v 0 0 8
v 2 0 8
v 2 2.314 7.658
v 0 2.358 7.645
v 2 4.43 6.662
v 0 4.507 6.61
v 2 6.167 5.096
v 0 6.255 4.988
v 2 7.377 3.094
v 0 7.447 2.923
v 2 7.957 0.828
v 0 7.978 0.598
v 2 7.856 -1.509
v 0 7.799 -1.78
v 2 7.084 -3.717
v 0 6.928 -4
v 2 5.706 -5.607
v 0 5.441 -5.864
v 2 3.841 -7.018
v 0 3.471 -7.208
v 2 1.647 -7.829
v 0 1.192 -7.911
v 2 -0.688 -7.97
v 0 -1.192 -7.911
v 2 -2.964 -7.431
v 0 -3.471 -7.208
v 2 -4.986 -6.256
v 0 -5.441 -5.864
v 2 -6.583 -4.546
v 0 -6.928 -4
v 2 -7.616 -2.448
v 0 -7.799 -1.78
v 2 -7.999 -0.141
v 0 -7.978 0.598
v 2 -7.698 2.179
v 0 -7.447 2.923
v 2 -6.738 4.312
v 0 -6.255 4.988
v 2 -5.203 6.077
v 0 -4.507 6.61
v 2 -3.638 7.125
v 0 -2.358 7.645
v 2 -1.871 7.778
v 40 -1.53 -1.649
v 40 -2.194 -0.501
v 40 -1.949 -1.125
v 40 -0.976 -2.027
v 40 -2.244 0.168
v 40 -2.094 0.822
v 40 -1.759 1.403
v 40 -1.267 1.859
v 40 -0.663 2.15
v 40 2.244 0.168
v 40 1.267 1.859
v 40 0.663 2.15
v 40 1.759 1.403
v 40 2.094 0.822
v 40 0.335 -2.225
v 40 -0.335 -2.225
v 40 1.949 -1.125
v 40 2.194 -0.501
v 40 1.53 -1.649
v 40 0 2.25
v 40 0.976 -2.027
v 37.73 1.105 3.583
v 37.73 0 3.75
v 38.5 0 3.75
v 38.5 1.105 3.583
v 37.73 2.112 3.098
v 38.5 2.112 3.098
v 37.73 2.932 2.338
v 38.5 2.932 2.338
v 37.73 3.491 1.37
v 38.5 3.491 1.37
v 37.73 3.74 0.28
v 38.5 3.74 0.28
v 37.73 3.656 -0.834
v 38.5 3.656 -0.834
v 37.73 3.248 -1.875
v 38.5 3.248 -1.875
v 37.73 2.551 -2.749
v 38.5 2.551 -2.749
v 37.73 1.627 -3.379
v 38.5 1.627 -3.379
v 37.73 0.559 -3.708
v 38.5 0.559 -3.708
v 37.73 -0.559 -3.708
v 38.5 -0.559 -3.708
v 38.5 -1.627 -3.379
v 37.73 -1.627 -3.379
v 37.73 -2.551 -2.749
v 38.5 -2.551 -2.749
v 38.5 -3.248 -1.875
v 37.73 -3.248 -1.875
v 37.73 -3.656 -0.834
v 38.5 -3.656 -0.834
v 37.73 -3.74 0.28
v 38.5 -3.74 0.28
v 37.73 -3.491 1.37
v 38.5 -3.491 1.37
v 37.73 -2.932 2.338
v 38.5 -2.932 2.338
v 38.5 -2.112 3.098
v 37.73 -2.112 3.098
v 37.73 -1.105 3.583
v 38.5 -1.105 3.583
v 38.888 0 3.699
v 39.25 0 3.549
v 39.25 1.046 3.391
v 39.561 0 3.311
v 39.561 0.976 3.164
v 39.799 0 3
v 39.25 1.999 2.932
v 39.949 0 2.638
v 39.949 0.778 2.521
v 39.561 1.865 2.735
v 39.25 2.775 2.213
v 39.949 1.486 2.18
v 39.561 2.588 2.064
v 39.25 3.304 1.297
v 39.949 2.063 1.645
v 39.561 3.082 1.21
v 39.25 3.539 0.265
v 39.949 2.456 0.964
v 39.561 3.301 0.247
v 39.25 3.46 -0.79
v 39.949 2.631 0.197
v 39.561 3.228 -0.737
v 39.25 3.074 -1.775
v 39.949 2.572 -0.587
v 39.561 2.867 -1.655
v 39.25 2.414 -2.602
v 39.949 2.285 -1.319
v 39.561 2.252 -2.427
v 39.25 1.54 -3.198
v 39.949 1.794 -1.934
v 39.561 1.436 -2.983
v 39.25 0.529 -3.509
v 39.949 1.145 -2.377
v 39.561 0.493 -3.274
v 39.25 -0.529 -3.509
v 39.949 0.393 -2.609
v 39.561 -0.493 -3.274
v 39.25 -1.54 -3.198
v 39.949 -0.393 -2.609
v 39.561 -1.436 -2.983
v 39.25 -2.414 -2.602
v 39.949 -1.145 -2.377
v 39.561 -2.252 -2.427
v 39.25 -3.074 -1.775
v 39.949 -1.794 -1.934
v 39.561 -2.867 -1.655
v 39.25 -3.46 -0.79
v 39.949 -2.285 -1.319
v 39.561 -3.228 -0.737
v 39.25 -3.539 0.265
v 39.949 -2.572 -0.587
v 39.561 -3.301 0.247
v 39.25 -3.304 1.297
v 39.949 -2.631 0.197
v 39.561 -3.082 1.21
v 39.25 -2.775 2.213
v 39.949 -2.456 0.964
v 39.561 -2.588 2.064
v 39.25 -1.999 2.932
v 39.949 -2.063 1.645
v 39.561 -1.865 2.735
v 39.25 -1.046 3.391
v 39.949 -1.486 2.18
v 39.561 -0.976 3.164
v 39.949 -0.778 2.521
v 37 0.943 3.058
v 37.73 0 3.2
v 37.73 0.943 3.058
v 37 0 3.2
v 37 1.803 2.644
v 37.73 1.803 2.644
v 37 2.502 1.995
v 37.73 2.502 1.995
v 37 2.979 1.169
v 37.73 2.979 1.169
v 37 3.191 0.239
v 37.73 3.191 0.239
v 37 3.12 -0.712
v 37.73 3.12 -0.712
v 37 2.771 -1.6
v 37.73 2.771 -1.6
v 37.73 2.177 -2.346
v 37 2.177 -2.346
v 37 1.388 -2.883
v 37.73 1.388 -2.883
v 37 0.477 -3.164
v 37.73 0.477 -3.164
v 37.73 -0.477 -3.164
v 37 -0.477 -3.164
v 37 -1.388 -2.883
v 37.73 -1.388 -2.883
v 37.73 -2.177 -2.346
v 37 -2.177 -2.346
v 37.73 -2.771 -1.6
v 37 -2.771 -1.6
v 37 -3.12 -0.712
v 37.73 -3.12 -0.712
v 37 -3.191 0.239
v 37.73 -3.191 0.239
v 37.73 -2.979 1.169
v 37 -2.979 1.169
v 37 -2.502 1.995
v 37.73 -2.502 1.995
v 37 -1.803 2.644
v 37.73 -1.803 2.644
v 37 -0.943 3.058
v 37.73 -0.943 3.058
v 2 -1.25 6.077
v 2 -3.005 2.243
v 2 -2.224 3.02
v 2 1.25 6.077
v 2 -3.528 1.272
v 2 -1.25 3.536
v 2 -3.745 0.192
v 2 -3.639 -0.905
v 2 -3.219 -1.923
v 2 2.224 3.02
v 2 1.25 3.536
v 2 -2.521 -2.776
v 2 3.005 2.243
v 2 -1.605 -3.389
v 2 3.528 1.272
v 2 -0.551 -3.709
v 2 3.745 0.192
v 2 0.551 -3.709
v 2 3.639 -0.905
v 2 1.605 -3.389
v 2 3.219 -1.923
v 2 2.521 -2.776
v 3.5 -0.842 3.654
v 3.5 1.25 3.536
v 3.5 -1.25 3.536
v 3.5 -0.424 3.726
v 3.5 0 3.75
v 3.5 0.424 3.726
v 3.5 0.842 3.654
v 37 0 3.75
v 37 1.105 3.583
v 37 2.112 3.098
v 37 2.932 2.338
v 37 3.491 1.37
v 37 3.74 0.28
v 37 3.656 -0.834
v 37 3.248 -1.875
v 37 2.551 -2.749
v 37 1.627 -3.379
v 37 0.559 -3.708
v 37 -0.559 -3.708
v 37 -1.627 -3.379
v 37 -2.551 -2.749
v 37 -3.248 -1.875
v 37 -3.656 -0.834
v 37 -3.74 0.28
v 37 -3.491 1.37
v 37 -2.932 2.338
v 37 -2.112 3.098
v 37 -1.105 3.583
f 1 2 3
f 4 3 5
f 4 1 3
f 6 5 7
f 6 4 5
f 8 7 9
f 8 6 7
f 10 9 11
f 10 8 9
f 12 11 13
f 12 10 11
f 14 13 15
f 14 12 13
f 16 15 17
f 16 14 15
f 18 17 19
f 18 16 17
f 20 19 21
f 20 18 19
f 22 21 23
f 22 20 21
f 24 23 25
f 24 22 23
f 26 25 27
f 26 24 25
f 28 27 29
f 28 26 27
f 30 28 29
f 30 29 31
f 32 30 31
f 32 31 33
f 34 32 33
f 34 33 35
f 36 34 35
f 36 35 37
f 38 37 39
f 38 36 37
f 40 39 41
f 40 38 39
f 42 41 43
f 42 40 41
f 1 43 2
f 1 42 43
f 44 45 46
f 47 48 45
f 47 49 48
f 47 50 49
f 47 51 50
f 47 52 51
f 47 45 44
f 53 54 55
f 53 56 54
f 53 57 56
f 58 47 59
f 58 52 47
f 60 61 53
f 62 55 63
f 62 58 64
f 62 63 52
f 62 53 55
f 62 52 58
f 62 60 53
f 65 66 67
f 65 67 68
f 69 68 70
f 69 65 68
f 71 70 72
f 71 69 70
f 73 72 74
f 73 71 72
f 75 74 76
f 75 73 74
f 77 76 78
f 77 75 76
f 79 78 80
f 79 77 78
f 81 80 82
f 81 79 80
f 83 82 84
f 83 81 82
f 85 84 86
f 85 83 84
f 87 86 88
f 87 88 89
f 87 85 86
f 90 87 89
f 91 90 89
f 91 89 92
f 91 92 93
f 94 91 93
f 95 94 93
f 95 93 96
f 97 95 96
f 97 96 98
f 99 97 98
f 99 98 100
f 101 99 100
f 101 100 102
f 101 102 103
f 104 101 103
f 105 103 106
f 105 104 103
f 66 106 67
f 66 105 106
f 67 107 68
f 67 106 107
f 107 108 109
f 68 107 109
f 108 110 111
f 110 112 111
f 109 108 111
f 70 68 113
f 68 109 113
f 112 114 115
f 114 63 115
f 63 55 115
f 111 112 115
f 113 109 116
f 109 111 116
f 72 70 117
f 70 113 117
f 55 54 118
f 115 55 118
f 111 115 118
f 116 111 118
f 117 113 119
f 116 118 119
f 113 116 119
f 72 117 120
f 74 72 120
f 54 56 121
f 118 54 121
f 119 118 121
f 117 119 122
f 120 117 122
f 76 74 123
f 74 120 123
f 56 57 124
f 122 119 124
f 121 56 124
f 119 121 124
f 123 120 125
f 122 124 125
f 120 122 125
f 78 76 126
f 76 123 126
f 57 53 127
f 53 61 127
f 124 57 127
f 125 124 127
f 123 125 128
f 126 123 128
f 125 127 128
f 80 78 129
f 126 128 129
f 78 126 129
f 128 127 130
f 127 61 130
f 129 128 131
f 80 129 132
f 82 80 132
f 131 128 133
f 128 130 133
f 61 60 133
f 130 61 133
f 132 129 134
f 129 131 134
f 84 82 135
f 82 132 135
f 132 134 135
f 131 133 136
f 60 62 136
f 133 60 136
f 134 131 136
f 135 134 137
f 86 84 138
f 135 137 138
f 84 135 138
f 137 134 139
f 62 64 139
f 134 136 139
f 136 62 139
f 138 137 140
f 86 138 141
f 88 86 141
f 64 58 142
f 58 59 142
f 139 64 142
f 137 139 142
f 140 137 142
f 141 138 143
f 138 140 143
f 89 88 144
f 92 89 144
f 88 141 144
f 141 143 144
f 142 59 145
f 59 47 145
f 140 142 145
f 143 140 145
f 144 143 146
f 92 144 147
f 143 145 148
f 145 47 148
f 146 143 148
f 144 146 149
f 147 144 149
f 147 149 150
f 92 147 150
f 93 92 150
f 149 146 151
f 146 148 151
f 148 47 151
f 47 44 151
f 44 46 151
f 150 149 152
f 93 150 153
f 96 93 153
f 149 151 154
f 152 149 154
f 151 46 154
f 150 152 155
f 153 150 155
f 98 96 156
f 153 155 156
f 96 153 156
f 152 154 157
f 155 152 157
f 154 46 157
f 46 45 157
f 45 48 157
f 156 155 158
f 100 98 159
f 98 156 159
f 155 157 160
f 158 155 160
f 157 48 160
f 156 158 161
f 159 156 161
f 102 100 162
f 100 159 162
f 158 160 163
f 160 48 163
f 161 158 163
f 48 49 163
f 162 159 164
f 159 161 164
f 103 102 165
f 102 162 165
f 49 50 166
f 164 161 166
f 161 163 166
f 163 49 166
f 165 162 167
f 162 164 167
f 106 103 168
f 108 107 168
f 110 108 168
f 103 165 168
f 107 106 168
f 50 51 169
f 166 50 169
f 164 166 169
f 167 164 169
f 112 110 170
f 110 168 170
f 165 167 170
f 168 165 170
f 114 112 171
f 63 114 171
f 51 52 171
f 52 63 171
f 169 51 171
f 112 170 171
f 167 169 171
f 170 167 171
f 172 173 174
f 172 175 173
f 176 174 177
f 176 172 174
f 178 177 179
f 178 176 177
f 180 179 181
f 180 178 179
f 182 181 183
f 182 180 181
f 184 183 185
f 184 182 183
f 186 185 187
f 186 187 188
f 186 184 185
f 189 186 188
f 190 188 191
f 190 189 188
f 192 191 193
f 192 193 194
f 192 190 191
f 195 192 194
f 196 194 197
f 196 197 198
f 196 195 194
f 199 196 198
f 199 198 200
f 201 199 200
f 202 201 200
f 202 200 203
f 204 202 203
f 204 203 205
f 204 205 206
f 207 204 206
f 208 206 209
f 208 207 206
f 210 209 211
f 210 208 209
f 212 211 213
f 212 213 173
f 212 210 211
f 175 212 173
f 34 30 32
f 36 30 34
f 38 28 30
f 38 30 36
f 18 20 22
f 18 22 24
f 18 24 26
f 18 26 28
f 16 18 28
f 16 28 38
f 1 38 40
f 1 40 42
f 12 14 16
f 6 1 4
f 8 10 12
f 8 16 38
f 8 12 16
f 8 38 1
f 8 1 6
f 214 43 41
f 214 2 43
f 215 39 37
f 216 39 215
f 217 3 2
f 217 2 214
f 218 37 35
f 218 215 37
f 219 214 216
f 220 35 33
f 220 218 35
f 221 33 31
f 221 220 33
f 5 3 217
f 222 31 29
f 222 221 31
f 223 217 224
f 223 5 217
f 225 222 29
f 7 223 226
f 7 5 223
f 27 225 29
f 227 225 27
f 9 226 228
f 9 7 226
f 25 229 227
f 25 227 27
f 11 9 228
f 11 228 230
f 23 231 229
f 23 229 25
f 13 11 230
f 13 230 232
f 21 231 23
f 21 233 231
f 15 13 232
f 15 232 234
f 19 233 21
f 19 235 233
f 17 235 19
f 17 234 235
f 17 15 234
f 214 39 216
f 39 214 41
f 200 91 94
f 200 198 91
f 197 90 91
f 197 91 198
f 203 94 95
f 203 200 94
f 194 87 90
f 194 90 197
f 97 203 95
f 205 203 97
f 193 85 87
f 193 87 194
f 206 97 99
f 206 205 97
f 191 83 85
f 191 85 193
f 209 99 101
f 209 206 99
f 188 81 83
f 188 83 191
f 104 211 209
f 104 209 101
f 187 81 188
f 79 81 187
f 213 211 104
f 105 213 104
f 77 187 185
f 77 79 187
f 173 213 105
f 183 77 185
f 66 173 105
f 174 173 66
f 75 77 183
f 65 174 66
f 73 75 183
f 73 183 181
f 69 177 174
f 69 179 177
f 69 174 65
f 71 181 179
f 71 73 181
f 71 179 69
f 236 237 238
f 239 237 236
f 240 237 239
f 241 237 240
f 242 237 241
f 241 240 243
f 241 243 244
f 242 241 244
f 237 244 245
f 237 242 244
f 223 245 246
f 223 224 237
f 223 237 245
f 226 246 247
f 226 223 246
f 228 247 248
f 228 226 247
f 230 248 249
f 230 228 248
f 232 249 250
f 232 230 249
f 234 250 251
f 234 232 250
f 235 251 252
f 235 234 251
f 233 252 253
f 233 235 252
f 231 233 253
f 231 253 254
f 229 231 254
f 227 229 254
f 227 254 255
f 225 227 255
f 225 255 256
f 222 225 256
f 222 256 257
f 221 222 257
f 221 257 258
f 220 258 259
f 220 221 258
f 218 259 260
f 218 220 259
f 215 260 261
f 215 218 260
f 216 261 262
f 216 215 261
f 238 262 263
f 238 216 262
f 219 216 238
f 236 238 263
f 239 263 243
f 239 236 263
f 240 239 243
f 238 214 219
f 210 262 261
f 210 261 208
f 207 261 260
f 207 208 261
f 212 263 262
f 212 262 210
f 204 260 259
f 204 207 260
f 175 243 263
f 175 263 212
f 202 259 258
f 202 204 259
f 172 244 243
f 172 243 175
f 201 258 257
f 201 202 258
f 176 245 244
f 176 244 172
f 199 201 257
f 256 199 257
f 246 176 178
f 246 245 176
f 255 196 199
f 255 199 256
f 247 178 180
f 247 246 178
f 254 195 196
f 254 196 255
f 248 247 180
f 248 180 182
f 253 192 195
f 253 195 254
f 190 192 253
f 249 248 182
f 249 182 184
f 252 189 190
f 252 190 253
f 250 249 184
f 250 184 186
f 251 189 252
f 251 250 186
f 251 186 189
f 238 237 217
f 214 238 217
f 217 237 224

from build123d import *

# Parameters (mm, degrees)
F3_DEPTH = 1.5
F5_DEPTH = 25
F6_R     = 1.5


with BuildPart() as f1:
    # F0 (on Front) → F1 (revolve)
    with BuildSketch(Plane.XZ):
        Polygon((0, 8), (0, 0), (40, 0), (40, 3.75), (37.73, 3.75), (37.73, 3.2), (37, 3.2), (37, 3.75), (2, 3.75), (2, 8), align=None)
    revolve(axis=Axis((20, 0, 0), (-1, 0, 0)))

    # F2 (on face) → F3 (join, symmetric)
    with BuildSketch(Plane.YZ.offset(2)):
        with BuildLine():
            Line((-1.25, 6.076651), (-1.25, 3.535534))
            ThreePointArc((-1.25, 3.535534), (0, 3.75), (1.25, 3.535534))
            Line((1.25, 3.535534), (1.25, 6.076651))
            Line((1.25, 6.076651), (-1.25, 6.076651))
        make_face()
    extrude(amount=F3_DEPTH, both=True)

    # F4 (on face) → F5 (cut)
    with BuildSketch(Plane(origin=(0, 1.25, 0), x_dir=(-1, 0, 0), z_dir=(0, 1, 0))):
        Polygon((-3.5, 3.535534), (-2, 6.076651), (-3.5, 6.076651), align=None)
    extrude(amount=-F5_DEPTH, mode=Mode.SUBTRACT)

    # F6
    f6_edges = [f1.edges().sort_by_distance(p)[0] for p in [
        (40, 0, -3.75),
    ]]
    fillet(f6_edges, radius=F6_R)


solid = f1.part
